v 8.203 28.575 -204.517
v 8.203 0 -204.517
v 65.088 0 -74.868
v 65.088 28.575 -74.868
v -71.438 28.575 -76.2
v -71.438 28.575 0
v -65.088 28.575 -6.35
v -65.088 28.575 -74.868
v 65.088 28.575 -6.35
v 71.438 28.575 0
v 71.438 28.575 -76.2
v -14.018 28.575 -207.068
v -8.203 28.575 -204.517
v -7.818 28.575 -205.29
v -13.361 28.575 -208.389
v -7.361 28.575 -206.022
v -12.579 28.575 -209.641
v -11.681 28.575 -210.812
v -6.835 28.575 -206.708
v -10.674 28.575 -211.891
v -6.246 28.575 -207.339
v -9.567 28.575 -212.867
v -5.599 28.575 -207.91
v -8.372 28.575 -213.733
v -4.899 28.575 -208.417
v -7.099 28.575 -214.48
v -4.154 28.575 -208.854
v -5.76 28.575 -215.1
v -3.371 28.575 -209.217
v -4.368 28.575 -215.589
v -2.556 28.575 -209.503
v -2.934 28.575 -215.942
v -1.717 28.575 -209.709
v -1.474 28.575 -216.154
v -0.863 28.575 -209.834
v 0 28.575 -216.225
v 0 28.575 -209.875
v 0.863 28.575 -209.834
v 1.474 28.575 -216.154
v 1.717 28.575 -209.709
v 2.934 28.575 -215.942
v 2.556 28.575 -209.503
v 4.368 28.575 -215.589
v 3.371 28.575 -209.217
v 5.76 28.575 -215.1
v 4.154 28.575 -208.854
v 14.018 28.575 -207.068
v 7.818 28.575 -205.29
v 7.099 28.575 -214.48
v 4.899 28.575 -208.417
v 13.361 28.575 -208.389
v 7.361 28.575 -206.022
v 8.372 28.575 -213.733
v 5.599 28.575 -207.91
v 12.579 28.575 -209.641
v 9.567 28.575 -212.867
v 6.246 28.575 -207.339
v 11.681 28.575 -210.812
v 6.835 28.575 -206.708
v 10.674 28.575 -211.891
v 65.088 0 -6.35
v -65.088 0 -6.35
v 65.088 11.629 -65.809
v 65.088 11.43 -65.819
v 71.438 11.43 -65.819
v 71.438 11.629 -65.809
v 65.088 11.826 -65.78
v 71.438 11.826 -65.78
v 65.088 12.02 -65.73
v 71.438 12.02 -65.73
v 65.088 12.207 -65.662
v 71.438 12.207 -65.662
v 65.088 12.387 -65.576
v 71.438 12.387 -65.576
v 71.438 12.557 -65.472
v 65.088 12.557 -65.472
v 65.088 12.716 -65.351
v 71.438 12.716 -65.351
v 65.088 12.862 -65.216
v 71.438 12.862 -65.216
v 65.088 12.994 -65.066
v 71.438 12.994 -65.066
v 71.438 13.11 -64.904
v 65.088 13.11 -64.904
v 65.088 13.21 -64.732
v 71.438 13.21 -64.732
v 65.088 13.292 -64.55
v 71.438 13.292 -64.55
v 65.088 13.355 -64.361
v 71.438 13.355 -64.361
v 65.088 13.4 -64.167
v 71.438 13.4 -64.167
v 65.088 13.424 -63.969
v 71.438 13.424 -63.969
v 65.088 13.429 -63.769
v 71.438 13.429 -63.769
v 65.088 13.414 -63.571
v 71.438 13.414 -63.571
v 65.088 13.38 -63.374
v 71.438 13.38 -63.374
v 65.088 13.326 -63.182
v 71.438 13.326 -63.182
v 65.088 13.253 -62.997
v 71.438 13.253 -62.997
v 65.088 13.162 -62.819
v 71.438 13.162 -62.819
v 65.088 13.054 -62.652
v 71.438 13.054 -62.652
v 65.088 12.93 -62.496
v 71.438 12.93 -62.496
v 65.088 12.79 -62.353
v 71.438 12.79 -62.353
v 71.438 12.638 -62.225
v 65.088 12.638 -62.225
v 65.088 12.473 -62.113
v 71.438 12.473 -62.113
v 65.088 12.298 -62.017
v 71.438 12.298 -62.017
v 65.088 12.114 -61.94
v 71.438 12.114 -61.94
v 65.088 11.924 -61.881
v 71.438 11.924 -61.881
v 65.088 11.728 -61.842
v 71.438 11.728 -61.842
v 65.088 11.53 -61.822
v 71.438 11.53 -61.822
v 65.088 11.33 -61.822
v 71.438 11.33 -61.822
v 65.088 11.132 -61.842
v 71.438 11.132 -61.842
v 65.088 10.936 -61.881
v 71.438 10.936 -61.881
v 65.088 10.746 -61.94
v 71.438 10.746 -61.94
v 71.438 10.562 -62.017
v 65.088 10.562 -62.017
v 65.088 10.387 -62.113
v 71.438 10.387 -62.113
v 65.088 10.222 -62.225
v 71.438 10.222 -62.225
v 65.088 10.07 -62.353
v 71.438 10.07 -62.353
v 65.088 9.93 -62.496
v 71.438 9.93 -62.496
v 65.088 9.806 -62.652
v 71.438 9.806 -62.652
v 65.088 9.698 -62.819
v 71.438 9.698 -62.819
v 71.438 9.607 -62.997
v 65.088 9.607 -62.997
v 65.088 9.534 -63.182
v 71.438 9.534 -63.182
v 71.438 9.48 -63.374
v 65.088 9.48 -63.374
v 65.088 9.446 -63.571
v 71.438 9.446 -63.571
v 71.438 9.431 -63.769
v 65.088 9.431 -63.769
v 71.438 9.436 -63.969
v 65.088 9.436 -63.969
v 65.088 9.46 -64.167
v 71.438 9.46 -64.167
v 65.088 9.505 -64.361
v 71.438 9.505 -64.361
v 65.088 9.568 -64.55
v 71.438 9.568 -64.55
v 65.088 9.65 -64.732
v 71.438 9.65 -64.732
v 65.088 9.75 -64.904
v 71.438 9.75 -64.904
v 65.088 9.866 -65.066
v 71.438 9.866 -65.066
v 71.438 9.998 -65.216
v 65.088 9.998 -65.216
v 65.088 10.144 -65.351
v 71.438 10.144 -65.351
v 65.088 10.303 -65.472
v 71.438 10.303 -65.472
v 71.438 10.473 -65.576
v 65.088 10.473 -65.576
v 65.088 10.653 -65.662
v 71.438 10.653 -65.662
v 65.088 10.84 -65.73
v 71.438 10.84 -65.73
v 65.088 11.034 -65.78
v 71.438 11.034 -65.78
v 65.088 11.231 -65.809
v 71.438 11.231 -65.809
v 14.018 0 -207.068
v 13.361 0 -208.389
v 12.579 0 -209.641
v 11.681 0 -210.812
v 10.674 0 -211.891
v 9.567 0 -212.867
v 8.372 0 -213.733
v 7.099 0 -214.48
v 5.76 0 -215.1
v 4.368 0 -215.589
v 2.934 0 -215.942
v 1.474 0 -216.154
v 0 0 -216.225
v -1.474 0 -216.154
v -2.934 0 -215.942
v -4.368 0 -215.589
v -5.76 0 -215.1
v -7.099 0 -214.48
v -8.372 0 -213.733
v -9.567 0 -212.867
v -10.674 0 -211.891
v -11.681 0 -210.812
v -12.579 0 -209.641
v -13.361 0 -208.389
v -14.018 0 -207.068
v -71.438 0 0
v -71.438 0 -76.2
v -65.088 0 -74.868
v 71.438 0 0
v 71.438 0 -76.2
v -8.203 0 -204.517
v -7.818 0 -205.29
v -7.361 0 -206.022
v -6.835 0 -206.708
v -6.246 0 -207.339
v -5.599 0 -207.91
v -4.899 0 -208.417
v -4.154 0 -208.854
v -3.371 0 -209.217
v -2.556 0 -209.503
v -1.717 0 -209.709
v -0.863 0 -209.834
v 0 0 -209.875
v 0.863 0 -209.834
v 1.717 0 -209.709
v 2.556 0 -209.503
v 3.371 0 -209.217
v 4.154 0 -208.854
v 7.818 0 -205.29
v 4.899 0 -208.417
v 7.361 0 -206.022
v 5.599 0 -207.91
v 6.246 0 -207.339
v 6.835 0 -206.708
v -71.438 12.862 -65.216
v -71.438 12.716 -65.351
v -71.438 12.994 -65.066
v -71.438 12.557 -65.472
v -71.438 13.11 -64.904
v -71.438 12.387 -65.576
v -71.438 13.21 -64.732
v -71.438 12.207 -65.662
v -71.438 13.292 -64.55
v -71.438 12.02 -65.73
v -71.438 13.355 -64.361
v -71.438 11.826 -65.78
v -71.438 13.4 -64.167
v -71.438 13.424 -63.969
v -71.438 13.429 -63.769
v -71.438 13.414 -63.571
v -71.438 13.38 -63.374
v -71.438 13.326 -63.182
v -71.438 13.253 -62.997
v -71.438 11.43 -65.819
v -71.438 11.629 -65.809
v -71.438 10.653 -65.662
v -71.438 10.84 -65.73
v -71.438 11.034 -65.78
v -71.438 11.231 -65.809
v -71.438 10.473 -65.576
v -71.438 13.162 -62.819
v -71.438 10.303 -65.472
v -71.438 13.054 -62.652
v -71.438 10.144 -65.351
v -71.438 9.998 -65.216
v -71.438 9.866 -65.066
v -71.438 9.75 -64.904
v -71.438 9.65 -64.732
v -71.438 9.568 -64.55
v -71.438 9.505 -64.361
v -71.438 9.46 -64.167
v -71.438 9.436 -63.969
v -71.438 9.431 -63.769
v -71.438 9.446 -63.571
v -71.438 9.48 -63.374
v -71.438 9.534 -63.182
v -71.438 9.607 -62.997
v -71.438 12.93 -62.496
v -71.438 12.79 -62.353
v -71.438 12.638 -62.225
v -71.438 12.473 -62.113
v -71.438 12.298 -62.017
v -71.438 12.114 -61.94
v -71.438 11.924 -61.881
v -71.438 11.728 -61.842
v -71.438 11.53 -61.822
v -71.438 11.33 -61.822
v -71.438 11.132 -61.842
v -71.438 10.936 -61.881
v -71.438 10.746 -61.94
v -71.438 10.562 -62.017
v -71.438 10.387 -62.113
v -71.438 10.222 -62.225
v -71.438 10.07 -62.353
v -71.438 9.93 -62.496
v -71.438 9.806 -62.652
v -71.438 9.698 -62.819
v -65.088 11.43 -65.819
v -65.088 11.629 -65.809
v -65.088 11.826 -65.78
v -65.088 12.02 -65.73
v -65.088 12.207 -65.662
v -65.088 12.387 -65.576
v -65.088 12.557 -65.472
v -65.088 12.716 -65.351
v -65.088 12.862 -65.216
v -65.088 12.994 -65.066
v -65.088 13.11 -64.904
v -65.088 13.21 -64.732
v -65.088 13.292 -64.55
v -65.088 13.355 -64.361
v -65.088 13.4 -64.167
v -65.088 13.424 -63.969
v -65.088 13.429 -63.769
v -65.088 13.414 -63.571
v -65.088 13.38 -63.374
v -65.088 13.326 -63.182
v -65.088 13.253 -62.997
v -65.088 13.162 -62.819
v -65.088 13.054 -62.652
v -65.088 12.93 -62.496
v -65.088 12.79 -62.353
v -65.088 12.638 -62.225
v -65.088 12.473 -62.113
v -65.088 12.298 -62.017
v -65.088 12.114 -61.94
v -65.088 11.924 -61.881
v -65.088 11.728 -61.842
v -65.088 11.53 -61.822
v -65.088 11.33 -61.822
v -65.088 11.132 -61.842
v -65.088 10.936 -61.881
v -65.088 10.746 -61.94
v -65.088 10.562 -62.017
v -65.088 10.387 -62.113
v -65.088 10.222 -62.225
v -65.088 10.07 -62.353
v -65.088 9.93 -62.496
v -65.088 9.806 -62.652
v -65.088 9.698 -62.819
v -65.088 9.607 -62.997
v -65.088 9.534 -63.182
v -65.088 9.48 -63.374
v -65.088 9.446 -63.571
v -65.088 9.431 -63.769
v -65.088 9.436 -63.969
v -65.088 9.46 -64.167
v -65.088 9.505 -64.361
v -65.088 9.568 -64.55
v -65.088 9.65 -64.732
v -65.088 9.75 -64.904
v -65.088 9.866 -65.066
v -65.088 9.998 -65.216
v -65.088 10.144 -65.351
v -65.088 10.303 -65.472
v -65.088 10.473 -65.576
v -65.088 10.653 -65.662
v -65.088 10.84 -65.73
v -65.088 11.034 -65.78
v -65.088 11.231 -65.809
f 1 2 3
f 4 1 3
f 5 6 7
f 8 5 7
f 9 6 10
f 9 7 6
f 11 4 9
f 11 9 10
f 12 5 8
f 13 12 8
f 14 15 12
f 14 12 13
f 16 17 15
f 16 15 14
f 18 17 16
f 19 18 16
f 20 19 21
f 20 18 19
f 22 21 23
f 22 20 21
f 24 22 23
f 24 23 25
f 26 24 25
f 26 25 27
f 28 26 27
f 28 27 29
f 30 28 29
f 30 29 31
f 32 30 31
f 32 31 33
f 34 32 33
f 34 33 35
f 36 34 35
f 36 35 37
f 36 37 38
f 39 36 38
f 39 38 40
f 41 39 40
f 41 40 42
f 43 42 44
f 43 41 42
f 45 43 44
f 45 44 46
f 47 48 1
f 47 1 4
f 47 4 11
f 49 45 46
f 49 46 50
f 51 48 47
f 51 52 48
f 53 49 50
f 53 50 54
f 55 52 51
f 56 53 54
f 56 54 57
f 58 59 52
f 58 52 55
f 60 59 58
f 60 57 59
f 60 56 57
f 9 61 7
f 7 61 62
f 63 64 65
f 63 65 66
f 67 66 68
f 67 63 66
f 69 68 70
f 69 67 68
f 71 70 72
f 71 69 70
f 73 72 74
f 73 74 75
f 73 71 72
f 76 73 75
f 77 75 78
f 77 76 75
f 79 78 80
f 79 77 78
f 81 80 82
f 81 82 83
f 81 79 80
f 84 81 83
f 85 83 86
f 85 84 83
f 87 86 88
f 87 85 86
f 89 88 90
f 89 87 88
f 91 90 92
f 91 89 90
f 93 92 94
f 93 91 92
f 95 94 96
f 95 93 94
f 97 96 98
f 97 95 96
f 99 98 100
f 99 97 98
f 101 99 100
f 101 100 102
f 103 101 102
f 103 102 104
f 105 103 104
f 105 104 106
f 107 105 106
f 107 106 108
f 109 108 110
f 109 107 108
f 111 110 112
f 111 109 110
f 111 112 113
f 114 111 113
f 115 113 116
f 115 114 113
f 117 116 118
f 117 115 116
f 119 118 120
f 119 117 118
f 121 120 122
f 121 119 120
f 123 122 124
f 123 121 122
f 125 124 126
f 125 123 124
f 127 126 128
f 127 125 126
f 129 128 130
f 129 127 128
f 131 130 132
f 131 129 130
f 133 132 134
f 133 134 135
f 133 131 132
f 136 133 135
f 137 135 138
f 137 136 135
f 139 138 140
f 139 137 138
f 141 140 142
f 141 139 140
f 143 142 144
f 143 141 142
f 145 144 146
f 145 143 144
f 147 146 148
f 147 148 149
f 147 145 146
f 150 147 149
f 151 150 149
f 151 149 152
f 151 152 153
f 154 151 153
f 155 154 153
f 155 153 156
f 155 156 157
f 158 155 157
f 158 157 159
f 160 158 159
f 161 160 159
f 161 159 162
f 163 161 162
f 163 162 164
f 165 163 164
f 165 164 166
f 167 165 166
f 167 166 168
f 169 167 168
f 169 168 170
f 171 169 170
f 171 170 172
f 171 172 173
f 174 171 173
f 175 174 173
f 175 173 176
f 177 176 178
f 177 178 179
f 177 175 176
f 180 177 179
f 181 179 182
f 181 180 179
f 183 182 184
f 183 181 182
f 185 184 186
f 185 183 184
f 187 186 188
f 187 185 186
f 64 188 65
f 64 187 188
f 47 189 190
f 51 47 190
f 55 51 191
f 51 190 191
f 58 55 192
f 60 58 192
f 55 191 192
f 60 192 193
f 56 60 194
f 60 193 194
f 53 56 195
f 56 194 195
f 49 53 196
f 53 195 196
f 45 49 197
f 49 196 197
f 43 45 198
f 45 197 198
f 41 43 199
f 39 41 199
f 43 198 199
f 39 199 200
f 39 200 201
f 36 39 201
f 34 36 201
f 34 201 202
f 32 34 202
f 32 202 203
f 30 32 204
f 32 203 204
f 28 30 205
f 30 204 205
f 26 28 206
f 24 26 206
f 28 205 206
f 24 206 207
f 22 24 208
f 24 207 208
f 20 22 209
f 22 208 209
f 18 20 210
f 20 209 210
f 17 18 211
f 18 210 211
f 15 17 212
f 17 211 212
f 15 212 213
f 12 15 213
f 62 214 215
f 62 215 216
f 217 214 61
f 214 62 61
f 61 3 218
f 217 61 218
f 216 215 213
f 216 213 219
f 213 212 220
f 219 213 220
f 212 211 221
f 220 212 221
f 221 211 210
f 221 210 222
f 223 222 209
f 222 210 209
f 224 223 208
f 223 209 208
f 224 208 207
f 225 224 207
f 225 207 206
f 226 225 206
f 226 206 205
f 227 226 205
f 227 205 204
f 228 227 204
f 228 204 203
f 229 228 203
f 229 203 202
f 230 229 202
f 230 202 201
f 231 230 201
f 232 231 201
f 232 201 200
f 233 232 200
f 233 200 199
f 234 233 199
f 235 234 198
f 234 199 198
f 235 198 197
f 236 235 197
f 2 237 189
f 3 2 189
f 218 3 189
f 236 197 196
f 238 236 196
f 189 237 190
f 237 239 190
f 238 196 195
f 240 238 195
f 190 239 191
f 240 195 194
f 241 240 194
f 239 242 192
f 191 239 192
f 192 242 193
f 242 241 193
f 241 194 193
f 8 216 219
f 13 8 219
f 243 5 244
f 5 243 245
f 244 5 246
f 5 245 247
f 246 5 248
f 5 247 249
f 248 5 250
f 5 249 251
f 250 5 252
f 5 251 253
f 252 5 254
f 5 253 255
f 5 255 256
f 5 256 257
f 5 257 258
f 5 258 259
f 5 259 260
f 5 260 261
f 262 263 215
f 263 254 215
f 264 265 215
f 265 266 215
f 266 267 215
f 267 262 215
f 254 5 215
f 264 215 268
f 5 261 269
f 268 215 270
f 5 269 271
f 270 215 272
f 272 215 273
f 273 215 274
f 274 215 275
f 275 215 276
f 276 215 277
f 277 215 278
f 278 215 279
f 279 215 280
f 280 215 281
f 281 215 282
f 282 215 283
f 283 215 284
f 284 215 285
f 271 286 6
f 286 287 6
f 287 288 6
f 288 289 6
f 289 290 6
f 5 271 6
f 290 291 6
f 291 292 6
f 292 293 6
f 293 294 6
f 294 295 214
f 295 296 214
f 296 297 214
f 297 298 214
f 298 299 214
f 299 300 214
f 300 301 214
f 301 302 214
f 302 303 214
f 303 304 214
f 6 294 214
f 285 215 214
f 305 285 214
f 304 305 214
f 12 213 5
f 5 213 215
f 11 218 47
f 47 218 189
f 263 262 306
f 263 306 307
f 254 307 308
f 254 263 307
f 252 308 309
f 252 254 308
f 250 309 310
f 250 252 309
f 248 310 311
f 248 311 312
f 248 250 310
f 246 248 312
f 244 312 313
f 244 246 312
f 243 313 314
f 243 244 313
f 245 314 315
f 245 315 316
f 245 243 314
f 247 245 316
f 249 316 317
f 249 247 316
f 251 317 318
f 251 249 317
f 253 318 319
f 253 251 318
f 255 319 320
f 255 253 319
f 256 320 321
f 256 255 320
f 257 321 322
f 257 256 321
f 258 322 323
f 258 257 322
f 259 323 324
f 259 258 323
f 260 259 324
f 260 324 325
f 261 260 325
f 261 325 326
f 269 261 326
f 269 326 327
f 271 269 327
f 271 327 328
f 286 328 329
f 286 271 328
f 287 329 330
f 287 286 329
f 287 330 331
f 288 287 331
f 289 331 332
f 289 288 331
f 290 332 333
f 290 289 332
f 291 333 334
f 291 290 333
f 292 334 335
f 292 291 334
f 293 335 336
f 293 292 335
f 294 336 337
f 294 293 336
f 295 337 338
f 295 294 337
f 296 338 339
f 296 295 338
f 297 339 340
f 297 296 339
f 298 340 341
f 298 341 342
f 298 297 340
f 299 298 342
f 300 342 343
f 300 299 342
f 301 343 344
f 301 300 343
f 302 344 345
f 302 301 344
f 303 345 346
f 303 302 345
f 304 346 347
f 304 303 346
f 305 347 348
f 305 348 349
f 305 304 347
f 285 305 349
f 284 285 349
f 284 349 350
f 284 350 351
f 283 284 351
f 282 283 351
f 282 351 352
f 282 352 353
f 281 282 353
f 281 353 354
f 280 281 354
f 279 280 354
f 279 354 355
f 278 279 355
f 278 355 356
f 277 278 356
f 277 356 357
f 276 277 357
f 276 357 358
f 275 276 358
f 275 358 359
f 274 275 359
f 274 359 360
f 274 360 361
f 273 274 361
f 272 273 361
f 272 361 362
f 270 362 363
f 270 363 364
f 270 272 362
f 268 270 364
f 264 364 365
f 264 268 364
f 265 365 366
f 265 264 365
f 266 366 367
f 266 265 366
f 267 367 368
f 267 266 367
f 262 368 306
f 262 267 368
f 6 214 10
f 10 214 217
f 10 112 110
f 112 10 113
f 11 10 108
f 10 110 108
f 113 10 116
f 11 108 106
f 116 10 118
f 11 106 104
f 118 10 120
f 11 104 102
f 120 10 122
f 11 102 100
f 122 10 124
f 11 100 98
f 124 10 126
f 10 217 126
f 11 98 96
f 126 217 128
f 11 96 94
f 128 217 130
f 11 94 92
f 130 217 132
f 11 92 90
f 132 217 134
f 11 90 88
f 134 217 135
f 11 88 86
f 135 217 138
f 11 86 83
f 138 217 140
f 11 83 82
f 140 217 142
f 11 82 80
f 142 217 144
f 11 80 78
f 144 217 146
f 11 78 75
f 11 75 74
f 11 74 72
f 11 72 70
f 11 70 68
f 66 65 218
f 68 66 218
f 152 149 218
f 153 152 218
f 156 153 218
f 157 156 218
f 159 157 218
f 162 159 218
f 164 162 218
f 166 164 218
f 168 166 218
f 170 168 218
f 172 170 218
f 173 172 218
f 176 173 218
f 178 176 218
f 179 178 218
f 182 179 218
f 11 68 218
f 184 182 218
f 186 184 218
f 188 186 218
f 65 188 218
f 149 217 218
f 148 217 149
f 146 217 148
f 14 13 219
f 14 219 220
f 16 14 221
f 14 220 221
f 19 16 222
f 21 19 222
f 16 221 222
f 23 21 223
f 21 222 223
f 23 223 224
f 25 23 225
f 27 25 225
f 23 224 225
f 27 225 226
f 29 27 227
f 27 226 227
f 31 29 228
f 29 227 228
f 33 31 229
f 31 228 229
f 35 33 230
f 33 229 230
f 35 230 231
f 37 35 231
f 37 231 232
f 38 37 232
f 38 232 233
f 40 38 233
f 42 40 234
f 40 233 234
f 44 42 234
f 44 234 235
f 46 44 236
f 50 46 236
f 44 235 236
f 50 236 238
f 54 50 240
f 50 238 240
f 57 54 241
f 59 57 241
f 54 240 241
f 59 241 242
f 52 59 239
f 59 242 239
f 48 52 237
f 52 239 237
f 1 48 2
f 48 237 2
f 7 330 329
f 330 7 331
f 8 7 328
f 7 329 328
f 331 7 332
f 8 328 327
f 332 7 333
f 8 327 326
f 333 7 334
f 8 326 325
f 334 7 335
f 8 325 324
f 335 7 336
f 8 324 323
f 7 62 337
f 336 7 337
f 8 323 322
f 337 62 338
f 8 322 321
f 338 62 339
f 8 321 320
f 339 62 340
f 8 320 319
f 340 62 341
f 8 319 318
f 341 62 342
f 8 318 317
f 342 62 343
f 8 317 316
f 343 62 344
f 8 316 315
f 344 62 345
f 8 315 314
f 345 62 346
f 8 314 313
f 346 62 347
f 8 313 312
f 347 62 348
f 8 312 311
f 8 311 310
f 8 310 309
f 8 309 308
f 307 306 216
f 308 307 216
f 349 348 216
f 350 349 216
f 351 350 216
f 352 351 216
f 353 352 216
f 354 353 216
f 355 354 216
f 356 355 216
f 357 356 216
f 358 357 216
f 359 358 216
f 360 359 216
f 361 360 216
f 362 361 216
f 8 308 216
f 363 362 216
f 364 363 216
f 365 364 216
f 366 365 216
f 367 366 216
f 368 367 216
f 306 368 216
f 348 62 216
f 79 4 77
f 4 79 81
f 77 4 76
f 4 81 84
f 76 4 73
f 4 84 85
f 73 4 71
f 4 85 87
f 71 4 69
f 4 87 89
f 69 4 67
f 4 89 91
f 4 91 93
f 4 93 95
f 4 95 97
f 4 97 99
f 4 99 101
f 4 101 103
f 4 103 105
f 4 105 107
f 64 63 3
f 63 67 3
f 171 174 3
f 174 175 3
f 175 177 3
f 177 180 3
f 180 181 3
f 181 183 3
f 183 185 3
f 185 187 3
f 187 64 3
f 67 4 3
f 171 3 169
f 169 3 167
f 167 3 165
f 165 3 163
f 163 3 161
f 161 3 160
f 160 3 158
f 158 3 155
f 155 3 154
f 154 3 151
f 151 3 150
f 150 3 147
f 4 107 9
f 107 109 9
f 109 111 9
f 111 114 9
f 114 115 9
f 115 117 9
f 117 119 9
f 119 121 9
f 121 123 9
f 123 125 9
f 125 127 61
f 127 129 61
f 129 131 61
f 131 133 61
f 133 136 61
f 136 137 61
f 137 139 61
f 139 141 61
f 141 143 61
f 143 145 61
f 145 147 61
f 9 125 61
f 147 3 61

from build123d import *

# Parameters (mm, degrees)
BOSS_EXTRUDE1_DEPTH = 28.575
CUT_EXTRUDE1_REACH  = 296.594
CUT_EXTRUDE1_START  = -65.0875
SKETCH2_R           = 2
CUT_EXTRUDE3_REACH  = 296.594
CUT_EXTRUDE3_START  = 65.0875
SKETCH2_2_R         = 2


with BuildPart() as part:
    # Sketch1 → Boss-Extrude1 (new body)
    with BuildSketch(Plane(origin=(0, 0, 0), x_dir=(1, 0, 0), z_dir=(0, 1, 0))):
        with BuildLine():
            Line((-71.4375, 0), (71.4375, 0))
            Line((71.4375, 0), (71.4375, 76.2))
            Line((71.4375, 76.2), (14.018084439, 207.068004883))
            ThreePointArc((14.018084439, 207.068004883), (0, 216.225490533), (-14.018084439, 207.068004883))
            Line((-14.018084439, 207.068004883), (-71.4375, 76.2))
            Line((-71.4375, 76.2), (-71.4375, 0))
        make_face()
        with BuildLine():
            Line((-65.0875, 6.35), (-65.0875, 74.868218206))
            Line((-65.0875, 74.868218206), (-8.203175338, 204.516665597))
            ThreePointArc((-8.203175338, 204.516665597), (0, 209.875490533), (8.203175338, 204.516665597))
            Line((8.203175338, 204.516665597), (65.0875, 74.868218206))
            Line((65.0875, 74.868218206), (65.0875, 6.35))
            Line((65.0875, 6.35), (-65.0875, 6.35))
        make_face(mode=Mode.SUBTRACT)
    extrude(amount=BOSS_EXTRUDE1_DEPTH)

    # Sketch2 → Cut-Extrude1 (cut, up to next)
    with BuildSketch(Plane(origin=(0, 0, 0), x_dir=(0, 0, -1), z_dir=(1, 0, 0)).offset(CUT_EXTRUDE1_START), mode=Mode.PRIVATE) as cut_extrude1_sk1:
        with Locations((63.819218206, 11.43)):
            Circle(SKETCH2_R)
    cut_extrude1_tool1 = extrude(cut_extrude1_sk1.sketch, amount=-CUT_EXTRUDE1_REACH, mode=Mode.PRIVATE) & part.part
    add(cut_extrude1_tool1.solids().sort_by_distance((-65.0875, 11.43, -63.819218))[0], mode=Mode.SUBTRACT)

    # Sketch2<2> → Cut-Extrude3 (cut, up to next)
    with BuildSketch(Plane(origin=(0, 0, 0), x_dir=(0, 0, -1), z_dir=(1, 0, 0)).offset(CUT_EXTRUDE3_START), mode=Mode.PRIVATE) as cut_extrude3_sk1:
        with Locations((63.819218206, 11.43)):
            Circle(SKETCH2_2_R)
    cut_extrude3_tool1 = extrude(cut_extrude3_sk1.sketch, amount=CUT_EXTRUDE3_REACH, mode=Mode.PRIVATE) & part.part
    add(cut_extrude3_tool1.solids().sort_by_distance((65.0875, 11.43, -63.819218))[0], mode=Mode.SUBTRACT)


solid = part.part
